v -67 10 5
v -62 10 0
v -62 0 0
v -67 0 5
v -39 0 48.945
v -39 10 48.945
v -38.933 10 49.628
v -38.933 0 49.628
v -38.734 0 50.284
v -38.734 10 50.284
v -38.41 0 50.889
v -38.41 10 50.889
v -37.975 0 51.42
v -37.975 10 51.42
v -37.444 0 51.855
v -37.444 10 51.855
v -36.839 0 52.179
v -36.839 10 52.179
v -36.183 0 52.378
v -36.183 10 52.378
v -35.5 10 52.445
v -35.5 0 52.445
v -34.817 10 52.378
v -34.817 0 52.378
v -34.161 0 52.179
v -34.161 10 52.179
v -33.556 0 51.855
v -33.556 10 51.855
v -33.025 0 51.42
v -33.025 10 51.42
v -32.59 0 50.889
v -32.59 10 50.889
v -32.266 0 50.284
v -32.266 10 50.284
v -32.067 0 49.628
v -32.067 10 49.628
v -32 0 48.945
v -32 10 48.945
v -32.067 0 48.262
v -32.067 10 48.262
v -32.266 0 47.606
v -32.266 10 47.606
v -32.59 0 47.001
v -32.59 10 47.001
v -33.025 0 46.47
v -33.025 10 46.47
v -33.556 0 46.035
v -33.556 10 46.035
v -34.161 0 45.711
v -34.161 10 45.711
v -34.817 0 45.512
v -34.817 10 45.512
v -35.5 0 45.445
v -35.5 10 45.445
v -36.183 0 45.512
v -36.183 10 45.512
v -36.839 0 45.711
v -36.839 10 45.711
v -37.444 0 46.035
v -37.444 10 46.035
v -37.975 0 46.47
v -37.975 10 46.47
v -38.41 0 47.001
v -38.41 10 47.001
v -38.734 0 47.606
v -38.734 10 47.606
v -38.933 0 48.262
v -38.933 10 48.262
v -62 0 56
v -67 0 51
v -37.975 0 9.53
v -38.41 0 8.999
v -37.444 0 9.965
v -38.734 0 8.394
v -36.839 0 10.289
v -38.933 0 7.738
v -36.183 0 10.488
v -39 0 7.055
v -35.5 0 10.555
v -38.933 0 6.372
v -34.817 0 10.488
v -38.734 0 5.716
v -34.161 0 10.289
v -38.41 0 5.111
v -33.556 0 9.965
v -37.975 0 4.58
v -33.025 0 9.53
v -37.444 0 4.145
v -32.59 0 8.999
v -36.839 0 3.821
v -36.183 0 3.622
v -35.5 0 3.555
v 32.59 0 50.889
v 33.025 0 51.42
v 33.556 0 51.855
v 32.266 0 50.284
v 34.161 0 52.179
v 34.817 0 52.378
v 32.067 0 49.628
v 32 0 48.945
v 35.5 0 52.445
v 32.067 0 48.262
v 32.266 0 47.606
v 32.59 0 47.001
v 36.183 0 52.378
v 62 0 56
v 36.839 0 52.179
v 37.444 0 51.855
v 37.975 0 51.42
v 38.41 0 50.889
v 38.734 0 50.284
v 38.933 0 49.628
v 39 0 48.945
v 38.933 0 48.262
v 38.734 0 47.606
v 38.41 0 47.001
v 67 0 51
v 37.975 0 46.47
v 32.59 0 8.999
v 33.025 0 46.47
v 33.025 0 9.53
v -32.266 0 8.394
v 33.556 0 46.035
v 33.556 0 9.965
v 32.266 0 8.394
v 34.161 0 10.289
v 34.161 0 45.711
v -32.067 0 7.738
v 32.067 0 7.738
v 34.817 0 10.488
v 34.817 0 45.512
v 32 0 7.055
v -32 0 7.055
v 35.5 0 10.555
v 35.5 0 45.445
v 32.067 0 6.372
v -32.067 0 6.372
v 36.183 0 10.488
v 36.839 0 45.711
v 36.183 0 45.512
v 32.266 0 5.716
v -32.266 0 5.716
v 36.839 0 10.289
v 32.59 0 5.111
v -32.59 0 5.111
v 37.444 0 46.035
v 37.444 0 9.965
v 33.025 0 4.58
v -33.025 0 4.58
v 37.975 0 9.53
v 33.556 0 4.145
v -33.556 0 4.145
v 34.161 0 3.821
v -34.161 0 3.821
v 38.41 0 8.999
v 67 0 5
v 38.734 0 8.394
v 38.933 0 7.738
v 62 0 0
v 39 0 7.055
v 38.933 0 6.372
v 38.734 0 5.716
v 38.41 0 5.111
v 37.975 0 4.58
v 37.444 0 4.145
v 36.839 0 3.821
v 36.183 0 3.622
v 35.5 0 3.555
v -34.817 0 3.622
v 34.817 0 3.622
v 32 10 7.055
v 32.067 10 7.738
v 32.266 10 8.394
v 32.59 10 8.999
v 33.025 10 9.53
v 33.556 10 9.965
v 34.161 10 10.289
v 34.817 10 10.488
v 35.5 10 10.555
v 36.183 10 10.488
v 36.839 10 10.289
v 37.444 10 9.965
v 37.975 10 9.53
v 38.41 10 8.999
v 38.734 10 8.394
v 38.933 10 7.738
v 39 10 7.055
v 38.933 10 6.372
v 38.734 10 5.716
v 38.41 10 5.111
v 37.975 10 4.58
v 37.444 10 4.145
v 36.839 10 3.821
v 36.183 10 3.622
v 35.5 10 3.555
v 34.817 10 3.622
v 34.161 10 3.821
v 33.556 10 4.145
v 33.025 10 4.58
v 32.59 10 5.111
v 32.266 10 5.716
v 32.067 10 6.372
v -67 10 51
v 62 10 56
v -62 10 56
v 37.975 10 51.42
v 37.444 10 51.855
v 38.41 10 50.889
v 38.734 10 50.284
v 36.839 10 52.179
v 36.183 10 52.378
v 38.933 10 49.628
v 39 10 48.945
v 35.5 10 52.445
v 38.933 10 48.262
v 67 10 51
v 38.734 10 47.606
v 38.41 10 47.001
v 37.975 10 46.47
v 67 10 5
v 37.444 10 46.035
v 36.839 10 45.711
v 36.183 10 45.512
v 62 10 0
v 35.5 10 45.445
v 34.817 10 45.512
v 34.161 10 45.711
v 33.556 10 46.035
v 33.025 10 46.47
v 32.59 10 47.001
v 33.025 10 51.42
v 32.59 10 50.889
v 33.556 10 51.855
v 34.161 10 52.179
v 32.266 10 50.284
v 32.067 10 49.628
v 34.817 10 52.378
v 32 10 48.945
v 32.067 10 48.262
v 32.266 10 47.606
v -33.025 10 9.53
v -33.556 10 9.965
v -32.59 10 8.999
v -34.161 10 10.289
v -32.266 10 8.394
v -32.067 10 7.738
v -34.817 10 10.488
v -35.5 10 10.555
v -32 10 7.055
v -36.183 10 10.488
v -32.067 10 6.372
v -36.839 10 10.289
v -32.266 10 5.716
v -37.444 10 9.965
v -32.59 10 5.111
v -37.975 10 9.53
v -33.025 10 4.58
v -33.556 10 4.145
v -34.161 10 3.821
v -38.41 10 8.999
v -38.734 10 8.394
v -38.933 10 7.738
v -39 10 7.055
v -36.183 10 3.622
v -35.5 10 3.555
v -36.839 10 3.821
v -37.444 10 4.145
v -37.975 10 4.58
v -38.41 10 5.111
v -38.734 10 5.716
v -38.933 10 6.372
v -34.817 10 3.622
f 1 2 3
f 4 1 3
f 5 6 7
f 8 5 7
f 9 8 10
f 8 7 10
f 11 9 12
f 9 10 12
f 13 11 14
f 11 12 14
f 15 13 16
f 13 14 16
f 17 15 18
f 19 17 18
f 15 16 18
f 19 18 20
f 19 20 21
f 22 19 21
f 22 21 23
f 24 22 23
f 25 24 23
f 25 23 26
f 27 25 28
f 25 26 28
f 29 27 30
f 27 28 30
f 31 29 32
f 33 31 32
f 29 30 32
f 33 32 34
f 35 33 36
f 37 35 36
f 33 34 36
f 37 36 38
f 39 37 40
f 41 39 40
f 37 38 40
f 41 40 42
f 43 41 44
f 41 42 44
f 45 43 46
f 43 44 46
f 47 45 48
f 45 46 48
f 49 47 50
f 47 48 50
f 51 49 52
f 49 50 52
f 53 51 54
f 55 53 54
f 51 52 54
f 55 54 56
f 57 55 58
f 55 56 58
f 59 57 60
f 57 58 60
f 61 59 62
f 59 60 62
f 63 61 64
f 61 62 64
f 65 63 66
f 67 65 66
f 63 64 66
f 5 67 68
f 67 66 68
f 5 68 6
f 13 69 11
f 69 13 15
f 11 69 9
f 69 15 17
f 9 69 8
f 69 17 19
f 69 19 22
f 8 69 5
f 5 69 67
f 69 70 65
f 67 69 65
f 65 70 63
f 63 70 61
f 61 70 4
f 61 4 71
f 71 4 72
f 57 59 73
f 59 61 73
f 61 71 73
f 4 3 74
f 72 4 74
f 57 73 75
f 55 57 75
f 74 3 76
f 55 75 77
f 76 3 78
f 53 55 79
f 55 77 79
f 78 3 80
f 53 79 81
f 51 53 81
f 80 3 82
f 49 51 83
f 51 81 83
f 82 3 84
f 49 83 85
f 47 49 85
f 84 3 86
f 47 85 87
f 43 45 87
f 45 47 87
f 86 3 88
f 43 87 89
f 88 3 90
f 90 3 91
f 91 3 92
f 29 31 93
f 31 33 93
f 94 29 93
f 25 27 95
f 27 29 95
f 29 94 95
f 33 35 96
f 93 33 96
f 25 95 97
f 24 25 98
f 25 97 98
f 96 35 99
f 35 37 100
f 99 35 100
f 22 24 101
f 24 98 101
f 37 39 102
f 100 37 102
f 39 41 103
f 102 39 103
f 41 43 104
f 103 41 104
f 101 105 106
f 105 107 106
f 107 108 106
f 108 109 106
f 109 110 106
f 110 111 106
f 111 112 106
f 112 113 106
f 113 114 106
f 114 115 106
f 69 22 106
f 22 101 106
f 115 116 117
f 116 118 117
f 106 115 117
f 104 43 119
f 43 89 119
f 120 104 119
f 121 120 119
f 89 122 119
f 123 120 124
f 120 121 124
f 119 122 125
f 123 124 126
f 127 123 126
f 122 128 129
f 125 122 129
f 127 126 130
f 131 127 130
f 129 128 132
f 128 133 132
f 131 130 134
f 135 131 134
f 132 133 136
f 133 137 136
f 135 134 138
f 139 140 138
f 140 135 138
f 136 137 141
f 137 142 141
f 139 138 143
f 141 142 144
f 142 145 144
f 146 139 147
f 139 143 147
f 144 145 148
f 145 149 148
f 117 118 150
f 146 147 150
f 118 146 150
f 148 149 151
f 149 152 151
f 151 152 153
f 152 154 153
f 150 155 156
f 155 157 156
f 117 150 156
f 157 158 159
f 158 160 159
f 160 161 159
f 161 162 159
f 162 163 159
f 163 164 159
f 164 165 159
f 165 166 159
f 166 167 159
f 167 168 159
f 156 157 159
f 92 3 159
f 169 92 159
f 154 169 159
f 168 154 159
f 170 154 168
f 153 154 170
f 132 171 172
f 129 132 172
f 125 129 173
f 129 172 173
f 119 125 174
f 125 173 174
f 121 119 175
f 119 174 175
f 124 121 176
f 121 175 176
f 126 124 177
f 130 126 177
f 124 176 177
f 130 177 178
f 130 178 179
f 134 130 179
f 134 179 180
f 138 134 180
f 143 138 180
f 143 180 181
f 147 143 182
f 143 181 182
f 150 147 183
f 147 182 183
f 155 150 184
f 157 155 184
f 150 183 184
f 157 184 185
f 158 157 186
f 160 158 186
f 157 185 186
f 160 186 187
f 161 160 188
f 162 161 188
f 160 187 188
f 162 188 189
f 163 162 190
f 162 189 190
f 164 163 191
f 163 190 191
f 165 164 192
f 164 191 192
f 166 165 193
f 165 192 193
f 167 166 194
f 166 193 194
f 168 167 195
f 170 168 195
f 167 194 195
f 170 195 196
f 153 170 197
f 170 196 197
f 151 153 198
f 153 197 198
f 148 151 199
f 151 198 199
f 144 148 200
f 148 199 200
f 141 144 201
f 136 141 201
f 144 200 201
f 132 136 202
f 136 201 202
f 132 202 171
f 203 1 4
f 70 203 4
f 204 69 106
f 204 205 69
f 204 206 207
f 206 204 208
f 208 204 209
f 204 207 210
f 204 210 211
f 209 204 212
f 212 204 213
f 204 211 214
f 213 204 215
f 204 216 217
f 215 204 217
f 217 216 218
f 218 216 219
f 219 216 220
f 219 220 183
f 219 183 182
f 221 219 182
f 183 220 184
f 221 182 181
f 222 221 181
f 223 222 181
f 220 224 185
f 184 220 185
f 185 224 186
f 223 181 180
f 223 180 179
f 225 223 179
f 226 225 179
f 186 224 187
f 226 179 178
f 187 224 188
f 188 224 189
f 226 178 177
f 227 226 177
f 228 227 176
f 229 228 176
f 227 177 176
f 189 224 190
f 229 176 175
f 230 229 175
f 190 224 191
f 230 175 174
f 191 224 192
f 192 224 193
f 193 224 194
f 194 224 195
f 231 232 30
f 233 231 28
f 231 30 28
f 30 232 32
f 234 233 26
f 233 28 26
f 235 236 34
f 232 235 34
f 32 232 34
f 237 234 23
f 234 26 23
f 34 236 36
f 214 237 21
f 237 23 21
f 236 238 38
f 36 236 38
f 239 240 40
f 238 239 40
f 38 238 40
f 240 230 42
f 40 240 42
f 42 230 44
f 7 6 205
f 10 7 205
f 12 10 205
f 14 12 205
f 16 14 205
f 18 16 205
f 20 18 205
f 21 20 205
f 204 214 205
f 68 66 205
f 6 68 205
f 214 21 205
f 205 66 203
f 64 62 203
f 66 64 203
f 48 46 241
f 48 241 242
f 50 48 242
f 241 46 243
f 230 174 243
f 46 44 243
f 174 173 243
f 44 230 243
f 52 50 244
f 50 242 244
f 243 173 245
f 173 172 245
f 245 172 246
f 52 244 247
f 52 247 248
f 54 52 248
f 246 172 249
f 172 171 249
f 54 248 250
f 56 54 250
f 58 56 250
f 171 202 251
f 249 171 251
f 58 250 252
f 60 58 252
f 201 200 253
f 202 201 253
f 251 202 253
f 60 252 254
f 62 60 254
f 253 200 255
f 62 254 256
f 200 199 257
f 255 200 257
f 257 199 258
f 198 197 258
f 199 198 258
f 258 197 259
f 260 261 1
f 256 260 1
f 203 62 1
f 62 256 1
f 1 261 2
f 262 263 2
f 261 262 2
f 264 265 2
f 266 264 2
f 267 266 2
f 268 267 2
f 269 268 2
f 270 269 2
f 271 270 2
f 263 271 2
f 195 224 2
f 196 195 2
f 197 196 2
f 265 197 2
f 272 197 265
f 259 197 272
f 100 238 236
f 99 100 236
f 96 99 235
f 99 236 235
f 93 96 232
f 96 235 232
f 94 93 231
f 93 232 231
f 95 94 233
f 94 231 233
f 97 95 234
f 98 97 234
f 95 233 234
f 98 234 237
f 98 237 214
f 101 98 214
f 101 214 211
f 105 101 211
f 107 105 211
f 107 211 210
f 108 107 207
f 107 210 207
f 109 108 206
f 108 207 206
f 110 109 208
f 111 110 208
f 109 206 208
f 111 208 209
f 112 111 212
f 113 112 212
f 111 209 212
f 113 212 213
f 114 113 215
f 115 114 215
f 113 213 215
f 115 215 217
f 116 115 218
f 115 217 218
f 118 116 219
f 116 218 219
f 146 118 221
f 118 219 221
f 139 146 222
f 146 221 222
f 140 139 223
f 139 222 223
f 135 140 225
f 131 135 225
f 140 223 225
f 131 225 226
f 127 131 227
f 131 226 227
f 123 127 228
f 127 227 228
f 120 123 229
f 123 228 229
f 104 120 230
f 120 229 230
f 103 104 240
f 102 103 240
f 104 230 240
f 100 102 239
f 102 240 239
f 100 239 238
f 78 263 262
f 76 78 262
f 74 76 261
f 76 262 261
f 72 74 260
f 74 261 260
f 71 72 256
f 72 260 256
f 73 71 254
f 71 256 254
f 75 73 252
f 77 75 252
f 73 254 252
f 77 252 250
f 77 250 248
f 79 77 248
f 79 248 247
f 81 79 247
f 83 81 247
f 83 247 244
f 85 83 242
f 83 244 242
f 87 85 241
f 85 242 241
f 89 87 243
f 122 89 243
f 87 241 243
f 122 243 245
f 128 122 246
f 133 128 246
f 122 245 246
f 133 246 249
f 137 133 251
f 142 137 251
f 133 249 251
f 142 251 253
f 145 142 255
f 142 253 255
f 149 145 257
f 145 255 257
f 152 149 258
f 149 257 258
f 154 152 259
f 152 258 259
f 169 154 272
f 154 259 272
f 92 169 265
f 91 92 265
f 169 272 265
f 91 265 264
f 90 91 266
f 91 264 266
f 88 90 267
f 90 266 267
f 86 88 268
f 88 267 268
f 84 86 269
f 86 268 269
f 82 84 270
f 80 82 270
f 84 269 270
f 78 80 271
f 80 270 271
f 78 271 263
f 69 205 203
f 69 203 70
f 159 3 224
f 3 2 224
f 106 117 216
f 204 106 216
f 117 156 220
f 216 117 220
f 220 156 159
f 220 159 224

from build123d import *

# Parameters (mm, degrees)
BOSS_EXTRUDE1_DEPTH = 56
SKETCH3_R           = 3.5
CUT_EXTRUDE1_DEPTH  = 10
CHAMFER1_SIZE       = 5


with BuildPart() as part:
    # Sketch2 → Boss-Extrude1 (new body)
    with BuildSketch(Plane.XY):
        Polygon((46, 10), (-46, 10), (-67, 10), (-67, 0), (-45, 0), (45, 0), (67, 0), (67, 10), align=None)
    extrude(amount=BOSS_EXTRUDE1_DEPTH)

    # Sketch3 → Cut-Extrude1 (cut)
    with BuildSketch(Plane(origin=(0, 10, 0), x_dir=(1, 0, 0), z_dir=(0, 1, 0))):
        with Locations(Location((-35.5, -7.055, 0), (0, 0, 180))):
            Circle(SKETCH3_R)
        with Locations(Location((35.5, -7.055, 0), (0, 0, 180))):
            Circle(SKETCH3_R)
        with Locations(Location((-35.5, -48.945, 0), (0, 0, 180))):
            Circle(SKETCH3_R)
        with Locations(Location((35.5, -48.945, 0), (0, 0, 180))):
            Circle(SKETCH3_R)
    extrude(amount=-CUT_EXTRUDE1_DEPTH, mode=Mode.SUBTRACT)

    # Chamfer1
    chamfer1_edges = [part.edges().sort_by_distance(p)[0] for p in [
        (67, 5, 0),
        (-67, 5, 56),
        (67, 5, 56),
        (-67, 5, 0),
    ]]
    chamfer(chamfer1_edges, length=CHAMFER1_SIZE)


solid = part.part
